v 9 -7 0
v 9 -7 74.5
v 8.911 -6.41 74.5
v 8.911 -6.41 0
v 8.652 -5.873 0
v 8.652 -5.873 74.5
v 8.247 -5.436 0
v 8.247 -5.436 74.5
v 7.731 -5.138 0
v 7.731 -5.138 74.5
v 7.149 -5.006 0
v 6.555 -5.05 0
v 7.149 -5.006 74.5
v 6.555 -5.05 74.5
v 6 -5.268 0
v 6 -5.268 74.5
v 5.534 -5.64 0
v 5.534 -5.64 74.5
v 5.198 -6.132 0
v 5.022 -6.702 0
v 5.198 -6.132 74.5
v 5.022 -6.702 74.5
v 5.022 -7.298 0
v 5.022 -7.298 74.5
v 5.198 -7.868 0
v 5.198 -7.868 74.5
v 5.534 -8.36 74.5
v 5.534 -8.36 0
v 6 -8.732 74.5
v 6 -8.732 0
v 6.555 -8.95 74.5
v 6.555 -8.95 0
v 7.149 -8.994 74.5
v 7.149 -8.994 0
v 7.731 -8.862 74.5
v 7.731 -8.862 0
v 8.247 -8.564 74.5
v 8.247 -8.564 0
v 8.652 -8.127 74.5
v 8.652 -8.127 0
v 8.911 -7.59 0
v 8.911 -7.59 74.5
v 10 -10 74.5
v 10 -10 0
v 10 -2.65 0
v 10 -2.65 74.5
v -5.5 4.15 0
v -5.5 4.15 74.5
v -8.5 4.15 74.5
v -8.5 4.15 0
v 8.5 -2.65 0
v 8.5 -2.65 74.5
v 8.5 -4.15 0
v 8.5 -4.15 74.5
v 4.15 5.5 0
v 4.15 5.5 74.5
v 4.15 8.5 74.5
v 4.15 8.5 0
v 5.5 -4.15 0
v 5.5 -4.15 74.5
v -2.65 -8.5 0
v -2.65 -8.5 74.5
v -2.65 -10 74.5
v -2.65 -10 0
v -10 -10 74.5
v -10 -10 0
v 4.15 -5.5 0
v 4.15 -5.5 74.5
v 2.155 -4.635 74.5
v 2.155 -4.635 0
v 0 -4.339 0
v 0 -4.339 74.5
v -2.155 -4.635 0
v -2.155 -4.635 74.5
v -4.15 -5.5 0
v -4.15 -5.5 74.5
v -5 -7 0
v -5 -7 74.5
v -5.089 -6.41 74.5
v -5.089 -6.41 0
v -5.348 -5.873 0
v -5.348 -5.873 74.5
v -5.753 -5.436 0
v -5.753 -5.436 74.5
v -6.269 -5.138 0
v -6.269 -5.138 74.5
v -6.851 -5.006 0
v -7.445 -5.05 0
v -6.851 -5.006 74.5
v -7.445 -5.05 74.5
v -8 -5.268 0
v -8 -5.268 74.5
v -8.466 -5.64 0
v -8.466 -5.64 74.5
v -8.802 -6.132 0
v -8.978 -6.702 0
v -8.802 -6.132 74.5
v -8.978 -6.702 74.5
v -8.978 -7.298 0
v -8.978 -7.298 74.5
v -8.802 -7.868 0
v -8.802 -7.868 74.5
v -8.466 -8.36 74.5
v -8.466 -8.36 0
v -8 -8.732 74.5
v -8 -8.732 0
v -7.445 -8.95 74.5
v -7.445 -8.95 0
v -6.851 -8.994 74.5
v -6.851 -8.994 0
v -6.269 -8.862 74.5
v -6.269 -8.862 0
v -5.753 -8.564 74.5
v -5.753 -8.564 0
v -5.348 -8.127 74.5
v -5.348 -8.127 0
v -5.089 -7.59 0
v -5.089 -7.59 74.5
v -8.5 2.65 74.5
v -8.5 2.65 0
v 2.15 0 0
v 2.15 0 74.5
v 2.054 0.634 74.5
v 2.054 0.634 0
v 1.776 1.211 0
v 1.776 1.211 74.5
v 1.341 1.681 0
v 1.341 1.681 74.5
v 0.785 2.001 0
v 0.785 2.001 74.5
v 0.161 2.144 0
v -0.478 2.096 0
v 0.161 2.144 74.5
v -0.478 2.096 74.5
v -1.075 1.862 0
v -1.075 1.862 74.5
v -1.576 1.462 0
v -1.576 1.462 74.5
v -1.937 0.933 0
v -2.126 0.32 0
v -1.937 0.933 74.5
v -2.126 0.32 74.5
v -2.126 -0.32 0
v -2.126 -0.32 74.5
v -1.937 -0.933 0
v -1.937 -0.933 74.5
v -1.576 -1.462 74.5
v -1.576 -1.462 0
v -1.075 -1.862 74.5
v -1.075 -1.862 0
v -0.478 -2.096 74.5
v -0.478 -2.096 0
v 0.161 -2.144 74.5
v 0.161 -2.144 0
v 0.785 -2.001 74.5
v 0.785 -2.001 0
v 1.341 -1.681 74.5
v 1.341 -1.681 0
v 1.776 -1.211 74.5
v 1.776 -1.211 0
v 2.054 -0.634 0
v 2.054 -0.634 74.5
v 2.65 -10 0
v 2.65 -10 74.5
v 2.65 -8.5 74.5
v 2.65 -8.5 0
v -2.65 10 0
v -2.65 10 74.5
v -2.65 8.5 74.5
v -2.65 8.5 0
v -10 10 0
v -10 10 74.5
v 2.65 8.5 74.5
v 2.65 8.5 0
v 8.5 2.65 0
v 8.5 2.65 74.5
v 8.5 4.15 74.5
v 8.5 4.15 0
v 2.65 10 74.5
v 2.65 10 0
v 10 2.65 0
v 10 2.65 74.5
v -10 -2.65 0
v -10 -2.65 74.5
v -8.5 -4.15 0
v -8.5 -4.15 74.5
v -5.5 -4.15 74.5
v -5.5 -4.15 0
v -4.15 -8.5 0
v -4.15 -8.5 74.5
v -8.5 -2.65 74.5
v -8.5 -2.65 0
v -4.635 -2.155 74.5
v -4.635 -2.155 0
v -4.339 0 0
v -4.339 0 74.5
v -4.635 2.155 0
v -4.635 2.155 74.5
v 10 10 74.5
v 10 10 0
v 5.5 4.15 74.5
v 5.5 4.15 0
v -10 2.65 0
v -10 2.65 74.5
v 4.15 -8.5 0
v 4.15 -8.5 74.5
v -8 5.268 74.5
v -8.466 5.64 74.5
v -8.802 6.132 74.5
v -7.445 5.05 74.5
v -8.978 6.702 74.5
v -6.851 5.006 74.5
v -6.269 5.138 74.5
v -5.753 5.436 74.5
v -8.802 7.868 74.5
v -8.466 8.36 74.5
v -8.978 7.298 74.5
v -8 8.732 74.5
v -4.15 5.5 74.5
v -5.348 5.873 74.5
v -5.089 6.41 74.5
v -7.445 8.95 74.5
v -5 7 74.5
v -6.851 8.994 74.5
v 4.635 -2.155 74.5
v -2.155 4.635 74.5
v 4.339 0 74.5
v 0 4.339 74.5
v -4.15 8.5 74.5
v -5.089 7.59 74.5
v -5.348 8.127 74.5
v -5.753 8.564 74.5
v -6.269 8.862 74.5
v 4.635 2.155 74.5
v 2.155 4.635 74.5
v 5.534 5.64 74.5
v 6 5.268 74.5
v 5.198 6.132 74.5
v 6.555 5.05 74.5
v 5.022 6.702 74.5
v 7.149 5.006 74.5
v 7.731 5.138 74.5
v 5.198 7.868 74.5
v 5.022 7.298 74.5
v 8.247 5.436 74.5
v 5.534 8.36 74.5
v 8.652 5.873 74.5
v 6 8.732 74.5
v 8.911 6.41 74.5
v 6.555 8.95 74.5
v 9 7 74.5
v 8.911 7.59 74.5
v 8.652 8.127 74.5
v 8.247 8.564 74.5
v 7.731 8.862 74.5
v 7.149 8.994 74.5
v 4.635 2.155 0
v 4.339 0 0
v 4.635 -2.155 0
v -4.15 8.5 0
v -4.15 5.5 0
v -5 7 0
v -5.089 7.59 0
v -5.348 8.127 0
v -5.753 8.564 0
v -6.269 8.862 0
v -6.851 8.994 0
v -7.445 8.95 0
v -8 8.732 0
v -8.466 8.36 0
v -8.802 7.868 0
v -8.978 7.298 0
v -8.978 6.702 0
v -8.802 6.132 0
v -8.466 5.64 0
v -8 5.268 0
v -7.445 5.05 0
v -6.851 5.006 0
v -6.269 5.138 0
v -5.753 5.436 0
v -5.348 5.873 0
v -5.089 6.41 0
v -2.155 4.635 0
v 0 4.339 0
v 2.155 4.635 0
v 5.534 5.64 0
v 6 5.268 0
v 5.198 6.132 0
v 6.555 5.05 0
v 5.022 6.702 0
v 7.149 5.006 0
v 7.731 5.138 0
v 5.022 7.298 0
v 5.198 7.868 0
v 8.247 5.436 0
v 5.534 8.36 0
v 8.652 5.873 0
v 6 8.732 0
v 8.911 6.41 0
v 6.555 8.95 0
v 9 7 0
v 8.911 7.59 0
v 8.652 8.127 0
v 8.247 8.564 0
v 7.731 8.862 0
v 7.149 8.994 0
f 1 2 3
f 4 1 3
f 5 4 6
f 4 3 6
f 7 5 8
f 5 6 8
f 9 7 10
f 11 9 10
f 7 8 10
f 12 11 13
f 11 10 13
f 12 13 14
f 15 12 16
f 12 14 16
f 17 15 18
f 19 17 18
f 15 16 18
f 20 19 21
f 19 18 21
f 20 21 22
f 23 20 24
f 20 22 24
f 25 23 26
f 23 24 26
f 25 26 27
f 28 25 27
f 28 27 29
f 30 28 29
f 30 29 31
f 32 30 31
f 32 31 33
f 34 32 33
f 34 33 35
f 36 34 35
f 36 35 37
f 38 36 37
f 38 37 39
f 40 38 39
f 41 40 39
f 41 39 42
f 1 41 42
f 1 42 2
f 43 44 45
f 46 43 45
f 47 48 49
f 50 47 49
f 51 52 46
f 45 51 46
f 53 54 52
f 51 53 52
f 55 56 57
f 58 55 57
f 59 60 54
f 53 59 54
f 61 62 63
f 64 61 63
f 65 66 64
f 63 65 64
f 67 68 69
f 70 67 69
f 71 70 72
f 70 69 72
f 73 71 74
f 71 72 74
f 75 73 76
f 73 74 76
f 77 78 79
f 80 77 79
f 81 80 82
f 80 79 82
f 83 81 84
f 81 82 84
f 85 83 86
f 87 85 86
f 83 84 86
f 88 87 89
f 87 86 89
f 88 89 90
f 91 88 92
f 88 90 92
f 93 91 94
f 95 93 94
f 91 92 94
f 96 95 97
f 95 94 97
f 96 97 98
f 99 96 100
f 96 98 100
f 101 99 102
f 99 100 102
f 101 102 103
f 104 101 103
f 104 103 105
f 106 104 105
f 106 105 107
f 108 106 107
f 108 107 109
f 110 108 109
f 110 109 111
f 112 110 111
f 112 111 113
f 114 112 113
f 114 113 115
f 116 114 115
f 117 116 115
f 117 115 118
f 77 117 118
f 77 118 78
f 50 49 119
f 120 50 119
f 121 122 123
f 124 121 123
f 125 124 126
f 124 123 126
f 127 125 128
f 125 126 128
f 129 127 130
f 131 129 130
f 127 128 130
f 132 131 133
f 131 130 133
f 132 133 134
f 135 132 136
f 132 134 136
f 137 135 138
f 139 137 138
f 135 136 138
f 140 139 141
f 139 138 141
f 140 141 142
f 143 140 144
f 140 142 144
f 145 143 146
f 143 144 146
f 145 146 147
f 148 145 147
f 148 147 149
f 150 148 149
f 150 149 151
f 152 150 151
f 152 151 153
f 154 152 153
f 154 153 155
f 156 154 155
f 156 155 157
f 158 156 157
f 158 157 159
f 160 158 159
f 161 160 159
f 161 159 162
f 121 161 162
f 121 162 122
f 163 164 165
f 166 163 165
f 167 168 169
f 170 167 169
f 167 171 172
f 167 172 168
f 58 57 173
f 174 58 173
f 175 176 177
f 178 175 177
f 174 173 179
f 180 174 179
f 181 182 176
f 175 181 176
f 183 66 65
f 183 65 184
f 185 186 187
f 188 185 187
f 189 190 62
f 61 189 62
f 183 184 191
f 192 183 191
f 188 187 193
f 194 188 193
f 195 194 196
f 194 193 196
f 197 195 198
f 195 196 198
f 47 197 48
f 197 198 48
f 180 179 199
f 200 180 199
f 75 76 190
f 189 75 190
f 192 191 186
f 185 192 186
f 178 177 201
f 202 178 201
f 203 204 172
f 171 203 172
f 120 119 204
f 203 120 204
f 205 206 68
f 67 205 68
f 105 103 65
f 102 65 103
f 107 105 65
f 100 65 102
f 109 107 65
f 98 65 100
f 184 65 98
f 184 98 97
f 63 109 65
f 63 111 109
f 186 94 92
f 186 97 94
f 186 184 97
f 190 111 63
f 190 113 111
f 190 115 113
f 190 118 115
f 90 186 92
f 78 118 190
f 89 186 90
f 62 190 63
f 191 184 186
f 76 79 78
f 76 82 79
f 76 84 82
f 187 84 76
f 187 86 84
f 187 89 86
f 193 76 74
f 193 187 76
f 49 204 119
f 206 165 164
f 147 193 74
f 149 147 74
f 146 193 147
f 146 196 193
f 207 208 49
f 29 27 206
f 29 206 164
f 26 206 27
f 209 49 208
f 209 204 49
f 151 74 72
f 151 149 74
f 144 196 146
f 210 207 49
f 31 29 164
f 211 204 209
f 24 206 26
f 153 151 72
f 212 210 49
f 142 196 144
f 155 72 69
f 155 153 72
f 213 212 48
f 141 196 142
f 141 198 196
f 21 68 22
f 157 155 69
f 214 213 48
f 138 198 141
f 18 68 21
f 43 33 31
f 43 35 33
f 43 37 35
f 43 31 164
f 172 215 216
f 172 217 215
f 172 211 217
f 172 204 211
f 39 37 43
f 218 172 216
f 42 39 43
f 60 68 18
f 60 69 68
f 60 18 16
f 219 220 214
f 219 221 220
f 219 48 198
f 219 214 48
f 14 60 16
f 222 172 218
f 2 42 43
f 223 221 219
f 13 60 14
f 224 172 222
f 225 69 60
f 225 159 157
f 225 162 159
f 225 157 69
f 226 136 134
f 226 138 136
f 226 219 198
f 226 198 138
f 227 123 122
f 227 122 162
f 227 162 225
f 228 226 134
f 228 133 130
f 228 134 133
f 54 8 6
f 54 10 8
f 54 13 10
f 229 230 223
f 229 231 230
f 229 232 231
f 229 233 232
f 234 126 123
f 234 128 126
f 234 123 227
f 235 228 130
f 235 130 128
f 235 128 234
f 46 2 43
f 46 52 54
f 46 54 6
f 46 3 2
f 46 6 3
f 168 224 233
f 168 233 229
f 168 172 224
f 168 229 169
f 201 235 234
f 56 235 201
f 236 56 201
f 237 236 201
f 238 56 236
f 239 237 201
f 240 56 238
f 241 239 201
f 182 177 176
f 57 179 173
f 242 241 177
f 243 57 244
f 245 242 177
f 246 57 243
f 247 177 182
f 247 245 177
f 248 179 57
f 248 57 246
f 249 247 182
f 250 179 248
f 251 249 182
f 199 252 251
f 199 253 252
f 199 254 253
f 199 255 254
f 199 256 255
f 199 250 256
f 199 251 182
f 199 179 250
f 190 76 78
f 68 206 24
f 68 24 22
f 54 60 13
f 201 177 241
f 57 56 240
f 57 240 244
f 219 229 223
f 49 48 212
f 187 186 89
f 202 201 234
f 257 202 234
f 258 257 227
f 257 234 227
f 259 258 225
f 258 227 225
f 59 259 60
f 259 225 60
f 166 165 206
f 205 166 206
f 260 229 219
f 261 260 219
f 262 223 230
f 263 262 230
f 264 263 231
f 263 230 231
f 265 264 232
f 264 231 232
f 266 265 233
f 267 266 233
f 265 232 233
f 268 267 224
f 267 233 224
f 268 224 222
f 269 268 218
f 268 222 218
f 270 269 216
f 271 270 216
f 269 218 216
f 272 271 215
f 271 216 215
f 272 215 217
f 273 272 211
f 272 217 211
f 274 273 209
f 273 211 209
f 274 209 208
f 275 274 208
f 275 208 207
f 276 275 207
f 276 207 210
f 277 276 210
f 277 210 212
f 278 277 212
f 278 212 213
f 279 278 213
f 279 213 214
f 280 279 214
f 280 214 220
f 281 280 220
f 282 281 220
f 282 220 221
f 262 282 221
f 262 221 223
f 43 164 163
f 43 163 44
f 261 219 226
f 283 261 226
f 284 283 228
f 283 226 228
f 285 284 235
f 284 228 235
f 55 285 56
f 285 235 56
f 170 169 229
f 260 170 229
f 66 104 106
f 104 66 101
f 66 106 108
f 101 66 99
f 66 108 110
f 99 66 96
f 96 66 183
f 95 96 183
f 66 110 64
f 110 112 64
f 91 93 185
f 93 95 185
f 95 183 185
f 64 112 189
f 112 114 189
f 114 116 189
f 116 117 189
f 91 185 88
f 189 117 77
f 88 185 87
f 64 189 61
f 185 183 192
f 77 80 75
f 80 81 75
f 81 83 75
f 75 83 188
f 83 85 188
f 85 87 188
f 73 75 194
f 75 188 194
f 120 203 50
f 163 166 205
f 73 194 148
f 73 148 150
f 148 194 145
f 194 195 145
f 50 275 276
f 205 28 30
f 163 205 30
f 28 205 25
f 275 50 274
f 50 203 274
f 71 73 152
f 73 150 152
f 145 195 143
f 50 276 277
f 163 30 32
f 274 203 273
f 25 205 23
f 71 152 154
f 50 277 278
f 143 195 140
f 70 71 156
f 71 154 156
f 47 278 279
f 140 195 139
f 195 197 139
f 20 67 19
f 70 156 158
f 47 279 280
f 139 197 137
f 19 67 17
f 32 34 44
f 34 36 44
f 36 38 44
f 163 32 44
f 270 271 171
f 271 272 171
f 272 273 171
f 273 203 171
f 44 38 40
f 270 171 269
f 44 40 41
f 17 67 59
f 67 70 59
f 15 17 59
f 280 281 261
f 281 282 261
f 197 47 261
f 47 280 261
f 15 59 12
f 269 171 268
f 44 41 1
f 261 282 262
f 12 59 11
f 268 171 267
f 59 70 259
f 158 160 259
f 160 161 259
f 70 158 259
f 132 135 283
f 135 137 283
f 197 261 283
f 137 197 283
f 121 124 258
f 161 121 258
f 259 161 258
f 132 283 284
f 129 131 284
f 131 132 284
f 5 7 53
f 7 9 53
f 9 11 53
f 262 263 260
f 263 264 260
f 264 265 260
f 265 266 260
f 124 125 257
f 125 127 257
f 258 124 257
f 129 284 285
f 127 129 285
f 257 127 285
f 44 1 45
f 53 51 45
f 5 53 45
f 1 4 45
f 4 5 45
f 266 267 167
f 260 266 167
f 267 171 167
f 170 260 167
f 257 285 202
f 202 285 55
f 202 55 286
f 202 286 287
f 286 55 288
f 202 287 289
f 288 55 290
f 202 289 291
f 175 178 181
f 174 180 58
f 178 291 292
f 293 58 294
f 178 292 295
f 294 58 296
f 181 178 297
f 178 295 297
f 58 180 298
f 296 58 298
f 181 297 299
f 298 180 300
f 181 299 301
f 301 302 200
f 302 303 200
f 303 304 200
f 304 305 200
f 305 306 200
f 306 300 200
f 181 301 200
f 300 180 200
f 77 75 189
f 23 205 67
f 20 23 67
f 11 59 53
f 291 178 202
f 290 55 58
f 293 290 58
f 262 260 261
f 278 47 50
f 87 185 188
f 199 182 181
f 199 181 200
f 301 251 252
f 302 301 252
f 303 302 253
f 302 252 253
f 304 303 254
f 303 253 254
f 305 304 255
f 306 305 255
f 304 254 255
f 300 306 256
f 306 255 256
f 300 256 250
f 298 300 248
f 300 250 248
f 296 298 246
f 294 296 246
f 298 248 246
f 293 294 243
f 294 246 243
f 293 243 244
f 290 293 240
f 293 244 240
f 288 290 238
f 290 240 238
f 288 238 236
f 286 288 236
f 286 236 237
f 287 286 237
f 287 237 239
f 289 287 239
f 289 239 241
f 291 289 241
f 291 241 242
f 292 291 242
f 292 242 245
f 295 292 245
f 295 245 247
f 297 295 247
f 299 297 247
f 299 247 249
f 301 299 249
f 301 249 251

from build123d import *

# Parameters (mm, degrees)
SKETCH_1_W          = 20
SKETCH_1_H          = 20
EXTRUDE_1_DEPTH     = 74.5
SKETCH_2_R          = 2.15
SKETCH_2_R_2        = 2
CUT_EXTRUDE_1_DEPTH = 315.5


with BuildPart() as part:
    # 스케치1 → 보스-돌출1 (new body)
    with BuildSketch(Plane.XY):
        Rectangle(SKETCH_1_W, SKETCH_1_H)
    extrude(amount=EXTRUDE_1_DEPTH)

    # 스케치2 → 컷-돌출1 (cut)
    with BuildSketch(Plane.XY.offset(74.5)):
        Circle(SKETCH_2_R)
        with Locations((-7, 7)):
            Circle(SKETCH_2_R_2)
        with Locations((7, 7)):
            Circle(SKETCH_2_R_2)
        with Locations((7, -7)):
            Circle(SKETCH_2_R_2)
        with Locations((-7, -7)):
            Circle(SKETCH_2_R_2)
        with BuildLine():
            Line((-2.65, 10), (-2.65, 8.5))
            Line((-2.65, 8.5), (-4.15, 8.5))
            Line((-4.15, 8.5), (-4.15, 5.5))
            ThreePointArc((-4.15, 5.5), (0, 4.339407869), (4.15, 5.5))
            Line((4.15, 5.5), (4.15, 8.5))
            Line((4.15, 8.5), (2.65, 8.5))
            Line((2.65, 8.5), (2.65, 10))
            Line((2.65, 10), (-2.65, 10))
        make_face()
        with BuildLine():
            Line((10, 2.65), (8.5, 2.65))
            Line((8.5, 2.65), (8.5, 4.15))
            Line((8.5, 4.15), (5.5, 4.15))
            ThreePointArc((5.5, 4.15), (4.339407869, 0), (5.5, -4.15))
            Line((5.5, -4.15), (8.5, -4.15))
            Line((8.5, -4.15), (8.5, -2.65))
            Line((8.5, -2.65), (10, -2.65))
            Line((10, -2.65), (10, 2.65))
        make_face()
        with BuildLine():
            Line((2.65, -10), (2.65, -8.5))
            Line((2.65, -8.5), (4.15, -8.5))
            Line((4.15, -8.5), (4.15, -5.5))
            ThreePointArc((4.15, -5.5), (0, -4.339407869), (-4.15, -5.5))
            Line((-4.15, -5.5), (-4.15, -8.5))
            Line((-4.15, -8.5), (-2.65, -8.5))
            Line((-2.65, -8.5), (-2.65, -10))
            Line((-2.65, -10), (2.65, -10))
        make_face()
        with BuildLine():
            Line((-10, -2.65), (-8.5, -2.65))
            Line((-8.5, -2.65), (-8.5, -4.15))
            Line((-8.5, -4.15), (-5.5, -4.15))
            ThreePointArc((-5.5, -4.15), (-4.339407869, 0), (-5.5, 4.15))
            Line((-5.5, 4.15), (-8.5, 4.15))
            Line((-8.5, 4.15), (-8.5, 2.65))
            Line((-8.5, 2.65), (-10, 2.65))
            Line((-10, 2.65), (-10, -2.65))
        make_face()
    extrude(amount=-CUT_EXTRUDE_1_DEPTH, mode=Mode.SUBTRACT)


solid = part.part
